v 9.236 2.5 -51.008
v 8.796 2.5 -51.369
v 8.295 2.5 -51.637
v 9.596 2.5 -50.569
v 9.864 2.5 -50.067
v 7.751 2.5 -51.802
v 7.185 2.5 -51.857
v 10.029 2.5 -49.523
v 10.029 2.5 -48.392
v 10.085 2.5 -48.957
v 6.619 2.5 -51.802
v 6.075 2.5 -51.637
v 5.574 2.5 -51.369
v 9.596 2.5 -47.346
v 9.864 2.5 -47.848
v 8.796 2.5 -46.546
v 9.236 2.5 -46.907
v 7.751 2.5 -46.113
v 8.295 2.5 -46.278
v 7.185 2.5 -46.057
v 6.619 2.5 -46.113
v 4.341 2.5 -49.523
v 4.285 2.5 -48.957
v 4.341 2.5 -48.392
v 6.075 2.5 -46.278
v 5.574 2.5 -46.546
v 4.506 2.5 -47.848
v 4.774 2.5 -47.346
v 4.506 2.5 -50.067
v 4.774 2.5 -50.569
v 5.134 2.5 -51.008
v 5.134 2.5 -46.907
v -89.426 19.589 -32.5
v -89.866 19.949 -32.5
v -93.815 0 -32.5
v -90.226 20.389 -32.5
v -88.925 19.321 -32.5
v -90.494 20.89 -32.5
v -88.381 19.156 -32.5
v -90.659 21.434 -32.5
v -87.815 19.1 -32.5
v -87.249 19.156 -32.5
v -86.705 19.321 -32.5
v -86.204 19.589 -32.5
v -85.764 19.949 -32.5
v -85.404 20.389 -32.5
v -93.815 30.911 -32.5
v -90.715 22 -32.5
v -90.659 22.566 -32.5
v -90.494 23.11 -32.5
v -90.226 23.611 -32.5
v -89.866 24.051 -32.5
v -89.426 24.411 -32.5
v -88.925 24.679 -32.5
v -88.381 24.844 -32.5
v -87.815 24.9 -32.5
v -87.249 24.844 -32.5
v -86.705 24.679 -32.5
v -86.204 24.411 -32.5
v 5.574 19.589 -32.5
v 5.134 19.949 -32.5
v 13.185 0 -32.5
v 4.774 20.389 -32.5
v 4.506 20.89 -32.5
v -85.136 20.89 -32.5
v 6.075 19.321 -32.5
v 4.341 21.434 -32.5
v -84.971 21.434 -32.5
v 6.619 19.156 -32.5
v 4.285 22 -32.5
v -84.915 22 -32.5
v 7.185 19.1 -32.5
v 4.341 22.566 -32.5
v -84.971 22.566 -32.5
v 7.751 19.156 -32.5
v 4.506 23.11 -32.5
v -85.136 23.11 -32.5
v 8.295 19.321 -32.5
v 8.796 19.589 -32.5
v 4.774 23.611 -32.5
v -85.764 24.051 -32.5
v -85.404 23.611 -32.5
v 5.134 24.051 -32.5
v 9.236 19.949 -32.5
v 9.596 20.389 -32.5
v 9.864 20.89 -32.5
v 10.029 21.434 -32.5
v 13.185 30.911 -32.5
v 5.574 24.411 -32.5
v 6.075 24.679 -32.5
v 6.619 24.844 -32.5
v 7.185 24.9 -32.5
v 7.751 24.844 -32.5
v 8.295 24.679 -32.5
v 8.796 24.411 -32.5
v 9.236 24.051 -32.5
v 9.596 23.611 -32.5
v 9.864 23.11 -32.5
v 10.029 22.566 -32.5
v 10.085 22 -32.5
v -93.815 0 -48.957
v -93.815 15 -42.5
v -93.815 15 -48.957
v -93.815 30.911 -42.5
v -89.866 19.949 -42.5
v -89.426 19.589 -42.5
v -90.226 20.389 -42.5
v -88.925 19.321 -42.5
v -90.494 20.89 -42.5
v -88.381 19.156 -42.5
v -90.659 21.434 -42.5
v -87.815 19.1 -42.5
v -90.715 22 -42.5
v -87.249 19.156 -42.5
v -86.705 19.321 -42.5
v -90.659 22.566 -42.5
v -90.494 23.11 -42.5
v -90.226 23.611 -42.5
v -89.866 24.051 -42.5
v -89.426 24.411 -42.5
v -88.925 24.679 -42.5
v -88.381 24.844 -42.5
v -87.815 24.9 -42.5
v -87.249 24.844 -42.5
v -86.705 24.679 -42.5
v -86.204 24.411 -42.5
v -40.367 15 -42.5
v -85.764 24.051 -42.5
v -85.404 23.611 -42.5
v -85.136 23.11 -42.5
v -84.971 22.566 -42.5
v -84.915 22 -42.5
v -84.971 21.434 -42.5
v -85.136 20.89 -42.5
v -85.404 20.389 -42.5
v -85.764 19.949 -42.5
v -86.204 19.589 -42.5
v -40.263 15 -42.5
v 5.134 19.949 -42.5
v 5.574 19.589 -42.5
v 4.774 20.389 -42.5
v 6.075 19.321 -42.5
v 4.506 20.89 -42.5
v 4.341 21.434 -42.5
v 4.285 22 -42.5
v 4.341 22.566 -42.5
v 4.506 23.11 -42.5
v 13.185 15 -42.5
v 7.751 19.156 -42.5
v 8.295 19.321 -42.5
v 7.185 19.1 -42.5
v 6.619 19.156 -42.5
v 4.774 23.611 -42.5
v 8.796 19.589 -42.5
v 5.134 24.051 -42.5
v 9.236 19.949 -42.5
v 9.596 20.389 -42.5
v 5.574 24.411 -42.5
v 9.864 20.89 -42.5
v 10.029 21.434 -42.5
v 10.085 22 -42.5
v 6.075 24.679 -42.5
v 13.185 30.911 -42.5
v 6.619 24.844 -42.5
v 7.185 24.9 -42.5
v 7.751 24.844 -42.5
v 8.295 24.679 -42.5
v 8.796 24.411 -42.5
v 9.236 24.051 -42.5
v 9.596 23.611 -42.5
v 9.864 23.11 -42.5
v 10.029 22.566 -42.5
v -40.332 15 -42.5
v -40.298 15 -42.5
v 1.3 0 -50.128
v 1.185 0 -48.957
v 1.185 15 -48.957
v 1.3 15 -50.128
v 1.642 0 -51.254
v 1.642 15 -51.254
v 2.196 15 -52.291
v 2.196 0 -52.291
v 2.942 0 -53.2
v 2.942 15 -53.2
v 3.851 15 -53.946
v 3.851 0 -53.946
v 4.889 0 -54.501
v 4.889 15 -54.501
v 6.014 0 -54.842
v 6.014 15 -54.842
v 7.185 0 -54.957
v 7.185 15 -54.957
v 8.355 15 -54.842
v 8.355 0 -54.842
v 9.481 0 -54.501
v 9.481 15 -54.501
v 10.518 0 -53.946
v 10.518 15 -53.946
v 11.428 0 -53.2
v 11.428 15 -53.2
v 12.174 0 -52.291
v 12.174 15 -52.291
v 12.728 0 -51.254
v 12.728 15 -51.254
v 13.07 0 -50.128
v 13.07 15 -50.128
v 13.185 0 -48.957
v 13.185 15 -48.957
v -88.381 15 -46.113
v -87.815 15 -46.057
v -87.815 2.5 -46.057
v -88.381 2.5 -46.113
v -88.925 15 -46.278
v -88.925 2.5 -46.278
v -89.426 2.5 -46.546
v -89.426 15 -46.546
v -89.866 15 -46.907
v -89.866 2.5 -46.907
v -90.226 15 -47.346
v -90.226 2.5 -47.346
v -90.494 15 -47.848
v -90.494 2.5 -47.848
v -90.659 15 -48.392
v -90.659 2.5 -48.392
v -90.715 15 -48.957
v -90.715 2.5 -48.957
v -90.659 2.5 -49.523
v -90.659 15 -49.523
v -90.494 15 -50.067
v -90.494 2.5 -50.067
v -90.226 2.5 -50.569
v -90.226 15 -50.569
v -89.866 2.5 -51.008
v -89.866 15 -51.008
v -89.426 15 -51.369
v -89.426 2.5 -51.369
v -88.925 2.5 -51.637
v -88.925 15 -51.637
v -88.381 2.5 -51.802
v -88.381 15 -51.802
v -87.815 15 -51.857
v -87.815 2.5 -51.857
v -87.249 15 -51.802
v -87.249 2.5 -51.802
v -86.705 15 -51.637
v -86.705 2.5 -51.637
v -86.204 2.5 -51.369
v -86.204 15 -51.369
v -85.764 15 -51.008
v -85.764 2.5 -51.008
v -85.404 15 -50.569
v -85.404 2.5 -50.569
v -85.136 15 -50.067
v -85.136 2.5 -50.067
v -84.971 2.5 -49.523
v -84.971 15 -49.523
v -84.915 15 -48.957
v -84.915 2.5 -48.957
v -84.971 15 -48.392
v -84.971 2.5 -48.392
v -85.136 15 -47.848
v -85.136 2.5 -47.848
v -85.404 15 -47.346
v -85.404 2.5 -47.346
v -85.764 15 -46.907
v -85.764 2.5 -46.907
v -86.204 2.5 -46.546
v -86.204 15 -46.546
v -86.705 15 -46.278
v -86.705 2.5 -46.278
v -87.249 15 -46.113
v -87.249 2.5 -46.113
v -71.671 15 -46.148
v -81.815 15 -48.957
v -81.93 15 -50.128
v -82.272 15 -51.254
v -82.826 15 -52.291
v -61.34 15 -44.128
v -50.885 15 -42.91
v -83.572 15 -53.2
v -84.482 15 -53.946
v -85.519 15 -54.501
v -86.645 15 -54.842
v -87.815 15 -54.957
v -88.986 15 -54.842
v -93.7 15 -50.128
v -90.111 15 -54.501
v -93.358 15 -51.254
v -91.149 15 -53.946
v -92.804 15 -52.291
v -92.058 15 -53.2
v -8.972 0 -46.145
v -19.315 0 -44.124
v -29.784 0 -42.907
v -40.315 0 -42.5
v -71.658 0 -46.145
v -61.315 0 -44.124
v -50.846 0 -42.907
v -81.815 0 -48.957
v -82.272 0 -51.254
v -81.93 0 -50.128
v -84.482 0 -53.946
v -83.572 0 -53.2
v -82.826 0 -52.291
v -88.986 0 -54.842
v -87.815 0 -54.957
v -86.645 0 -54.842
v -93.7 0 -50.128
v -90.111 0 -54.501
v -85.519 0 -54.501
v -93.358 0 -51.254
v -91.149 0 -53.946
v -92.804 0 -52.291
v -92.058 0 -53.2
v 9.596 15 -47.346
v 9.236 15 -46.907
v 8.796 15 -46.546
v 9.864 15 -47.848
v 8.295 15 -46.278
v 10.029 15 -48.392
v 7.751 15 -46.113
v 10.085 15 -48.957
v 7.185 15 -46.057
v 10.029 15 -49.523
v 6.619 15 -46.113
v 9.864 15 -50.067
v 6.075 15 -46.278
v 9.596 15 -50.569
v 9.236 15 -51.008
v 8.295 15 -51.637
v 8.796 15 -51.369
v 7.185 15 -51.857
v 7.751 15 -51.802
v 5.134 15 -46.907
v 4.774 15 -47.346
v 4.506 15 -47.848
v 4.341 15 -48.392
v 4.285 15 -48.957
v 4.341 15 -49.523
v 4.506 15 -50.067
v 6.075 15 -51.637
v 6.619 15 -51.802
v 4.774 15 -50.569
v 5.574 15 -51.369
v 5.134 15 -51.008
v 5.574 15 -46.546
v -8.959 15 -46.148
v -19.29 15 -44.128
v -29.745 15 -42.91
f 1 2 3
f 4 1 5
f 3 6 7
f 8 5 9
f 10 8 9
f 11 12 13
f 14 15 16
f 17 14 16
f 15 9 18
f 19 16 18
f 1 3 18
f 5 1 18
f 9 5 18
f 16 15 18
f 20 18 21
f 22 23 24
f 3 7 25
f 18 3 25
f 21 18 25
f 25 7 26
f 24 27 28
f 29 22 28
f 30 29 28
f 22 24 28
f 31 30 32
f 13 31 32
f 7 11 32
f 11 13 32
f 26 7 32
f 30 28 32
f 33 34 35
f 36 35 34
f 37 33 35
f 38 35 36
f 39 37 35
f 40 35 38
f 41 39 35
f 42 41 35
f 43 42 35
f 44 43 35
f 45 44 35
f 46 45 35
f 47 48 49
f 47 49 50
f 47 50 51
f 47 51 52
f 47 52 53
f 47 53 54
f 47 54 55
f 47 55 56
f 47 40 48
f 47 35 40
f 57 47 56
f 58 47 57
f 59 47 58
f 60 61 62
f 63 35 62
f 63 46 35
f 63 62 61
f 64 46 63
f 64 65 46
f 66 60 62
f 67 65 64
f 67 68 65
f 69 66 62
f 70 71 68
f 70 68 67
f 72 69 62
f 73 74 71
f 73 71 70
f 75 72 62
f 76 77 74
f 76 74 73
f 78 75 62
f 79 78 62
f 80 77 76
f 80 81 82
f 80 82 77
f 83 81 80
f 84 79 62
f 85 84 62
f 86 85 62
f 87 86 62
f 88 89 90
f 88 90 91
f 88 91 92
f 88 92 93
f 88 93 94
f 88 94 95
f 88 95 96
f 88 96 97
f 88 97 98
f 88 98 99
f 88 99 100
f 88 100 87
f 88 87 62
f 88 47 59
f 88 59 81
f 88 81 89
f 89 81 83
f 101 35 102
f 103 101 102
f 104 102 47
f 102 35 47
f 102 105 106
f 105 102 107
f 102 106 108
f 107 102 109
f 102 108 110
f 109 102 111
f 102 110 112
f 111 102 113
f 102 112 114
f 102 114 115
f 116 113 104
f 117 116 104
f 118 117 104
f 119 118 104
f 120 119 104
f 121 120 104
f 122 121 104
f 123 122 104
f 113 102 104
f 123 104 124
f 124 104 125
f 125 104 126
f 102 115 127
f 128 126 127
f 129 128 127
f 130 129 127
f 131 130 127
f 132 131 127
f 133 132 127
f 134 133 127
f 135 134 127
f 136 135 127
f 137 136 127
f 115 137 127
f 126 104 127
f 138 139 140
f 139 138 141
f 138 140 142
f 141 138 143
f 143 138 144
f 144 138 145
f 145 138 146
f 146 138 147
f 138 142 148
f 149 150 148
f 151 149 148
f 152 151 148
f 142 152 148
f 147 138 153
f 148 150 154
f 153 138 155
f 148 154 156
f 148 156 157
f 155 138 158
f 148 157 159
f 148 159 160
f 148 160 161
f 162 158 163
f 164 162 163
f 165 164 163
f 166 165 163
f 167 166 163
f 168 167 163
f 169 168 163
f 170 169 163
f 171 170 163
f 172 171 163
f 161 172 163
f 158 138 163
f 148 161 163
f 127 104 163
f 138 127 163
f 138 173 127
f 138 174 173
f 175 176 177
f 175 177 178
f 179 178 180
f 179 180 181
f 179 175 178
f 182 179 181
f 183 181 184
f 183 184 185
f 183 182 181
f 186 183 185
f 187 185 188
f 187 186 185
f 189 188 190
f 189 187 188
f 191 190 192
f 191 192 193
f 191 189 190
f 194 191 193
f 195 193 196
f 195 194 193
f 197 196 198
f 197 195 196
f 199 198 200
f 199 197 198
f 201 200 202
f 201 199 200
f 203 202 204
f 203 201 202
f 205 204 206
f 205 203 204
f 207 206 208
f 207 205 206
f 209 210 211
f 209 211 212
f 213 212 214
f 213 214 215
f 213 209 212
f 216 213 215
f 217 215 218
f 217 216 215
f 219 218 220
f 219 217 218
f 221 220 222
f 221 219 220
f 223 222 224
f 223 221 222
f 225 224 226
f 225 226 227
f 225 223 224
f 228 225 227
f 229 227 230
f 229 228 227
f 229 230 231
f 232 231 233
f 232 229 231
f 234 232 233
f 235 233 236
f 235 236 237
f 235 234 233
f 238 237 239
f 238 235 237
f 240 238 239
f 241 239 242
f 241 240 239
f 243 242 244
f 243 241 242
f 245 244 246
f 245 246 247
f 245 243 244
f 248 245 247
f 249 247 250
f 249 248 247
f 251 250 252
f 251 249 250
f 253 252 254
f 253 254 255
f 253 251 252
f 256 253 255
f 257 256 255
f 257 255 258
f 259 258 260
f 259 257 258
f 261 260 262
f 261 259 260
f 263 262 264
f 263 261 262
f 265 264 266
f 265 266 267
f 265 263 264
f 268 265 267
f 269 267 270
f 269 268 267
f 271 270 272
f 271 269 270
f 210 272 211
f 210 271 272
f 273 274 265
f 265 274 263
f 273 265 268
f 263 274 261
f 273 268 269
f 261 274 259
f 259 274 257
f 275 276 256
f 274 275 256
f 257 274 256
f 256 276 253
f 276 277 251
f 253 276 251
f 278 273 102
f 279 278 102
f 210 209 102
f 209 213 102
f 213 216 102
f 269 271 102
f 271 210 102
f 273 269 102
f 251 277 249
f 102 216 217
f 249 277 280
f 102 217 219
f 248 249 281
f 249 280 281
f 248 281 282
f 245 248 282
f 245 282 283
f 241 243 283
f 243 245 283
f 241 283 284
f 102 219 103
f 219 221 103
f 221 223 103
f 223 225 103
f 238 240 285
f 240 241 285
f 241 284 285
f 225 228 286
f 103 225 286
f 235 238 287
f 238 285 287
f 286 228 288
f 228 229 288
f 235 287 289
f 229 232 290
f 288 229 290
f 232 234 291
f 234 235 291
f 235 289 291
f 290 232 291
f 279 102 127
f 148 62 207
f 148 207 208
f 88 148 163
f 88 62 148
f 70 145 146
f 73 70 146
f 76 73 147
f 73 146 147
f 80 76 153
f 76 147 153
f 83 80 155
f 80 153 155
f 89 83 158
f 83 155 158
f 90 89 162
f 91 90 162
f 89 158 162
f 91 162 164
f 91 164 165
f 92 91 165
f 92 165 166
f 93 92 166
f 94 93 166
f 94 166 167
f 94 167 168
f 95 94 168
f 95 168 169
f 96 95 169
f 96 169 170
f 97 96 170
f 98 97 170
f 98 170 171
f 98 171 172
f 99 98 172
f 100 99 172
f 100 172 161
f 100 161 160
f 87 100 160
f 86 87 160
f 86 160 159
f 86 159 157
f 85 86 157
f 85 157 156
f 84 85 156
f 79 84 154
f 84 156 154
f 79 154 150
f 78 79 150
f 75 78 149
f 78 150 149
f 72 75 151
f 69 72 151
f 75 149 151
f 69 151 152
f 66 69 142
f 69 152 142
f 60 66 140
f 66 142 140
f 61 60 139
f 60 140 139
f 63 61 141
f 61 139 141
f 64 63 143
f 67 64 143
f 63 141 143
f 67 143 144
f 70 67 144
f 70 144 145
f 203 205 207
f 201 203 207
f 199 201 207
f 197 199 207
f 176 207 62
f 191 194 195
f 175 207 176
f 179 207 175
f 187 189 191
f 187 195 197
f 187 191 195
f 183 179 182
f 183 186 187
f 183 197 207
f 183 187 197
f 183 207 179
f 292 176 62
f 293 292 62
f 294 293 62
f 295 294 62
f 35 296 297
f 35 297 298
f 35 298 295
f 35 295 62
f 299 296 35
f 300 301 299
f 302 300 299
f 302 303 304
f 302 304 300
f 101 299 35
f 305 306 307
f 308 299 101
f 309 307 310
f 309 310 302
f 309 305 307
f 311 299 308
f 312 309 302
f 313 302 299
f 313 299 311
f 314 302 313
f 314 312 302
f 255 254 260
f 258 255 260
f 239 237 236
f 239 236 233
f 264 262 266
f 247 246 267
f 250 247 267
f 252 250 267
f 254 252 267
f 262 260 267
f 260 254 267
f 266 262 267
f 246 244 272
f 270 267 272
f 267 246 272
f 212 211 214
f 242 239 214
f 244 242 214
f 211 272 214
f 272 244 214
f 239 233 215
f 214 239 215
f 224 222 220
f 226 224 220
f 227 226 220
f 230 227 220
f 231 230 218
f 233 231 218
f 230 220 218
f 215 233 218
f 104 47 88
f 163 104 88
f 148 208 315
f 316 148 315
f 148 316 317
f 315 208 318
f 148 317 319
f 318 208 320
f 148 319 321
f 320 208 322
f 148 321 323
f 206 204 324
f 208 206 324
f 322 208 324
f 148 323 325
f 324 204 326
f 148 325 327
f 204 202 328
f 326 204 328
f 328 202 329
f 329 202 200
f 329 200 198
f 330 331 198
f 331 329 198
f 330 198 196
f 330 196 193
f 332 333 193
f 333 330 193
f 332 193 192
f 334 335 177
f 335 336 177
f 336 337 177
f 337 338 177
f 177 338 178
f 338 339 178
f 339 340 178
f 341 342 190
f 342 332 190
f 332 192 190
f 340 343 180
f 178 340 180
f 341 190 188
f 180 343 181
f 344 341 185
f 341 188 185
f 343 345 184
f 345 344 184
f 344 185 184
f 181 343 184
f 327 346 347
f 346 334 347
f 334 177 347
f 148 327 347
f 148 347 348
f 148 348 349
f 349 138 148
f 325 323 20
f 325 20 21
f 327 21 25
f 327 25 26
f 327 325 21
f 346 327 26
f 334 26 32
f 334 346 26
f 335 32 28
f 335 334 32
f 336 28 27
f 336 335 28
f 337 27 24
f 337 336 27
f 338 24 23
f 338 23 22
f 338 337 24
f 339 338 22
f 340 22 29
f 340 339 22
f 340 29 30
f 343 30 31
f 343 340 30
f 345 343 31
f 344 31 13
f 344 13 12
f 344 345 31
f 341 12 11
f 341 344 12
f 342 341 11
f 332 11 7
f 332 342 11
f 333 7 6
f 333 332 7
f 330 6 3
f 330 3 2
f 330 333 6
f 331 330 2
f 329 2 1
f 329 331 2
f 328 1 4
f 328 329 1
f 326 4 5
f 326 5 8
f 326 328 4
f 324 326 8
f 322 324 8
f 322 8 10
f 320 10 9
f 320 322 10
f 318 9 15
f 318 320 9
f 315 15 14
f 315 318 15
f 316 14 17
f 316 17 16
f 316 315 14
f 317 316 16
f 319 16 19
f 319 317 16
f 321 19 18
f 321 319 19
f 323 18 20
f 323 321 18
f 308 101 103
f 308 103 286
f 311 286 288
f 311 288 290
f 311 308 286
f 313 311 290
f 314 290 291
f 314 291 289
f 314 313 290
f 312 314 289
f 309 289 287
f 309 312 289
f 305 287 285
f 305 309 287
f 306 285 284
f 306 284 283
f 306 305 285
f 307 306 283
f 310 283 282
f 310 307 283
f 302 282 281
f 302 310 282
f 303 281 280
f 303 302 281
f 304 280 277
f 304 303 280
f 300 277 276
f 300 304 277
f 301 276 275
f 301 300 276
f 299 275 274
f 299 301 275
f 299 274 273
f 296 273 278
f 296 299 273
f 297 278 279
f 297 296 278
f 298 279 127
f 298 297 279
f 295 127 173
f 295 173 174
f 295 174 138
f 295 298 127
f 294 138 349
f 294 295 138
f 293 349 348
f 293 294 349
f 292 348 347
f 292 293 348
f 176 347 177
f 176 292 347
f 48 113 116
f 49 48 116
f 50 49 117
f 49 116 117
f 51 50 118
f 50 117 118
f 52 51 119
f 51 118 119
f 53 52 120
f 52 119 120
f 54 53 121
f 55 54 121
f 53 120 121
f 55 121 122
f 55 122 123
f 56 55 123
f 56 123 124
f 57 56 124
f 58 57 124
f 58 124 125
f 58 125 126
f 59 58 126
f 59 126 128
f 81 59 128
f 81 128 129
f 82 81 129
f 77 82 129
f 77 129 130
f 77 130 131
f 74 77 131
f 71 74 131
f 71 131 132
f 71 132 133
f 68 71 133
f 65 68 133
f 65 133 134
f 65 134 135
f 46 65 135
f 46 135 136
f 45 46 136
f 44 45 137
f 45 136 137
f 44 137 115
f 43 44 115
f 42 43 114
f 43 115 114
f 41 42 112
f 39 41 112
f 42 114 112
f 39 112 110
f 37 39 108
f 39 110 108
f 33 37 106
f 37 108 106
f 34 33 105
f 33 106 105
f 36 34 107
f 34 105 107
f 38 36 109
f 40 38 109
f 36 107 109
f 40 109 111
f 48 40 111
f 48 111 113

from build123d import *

# Parameters (mm, degrees)
BOSS_EXTRUDE1_DEPTH = 15
SKETCH5_W           = 107
SKETCH5_H           = 15.91087052
BOSS_EXTRUDE2_DEPTH = 10
CUT_EXTRUDE1_START  = -15
SKETCH6_R           = 2.9
CUT_EXTRUDE1_DEPTH  = 12.5
SKETCH7_R           = 2.9
CUT_EXTRUDE2_DEPTH  = 12.5


with BuildPart() as part:
    # Sketch4 → Boss-Extrude1 (new body)
    with BuildSketch(Plane(origin=(0, 0, 0), x_dir=(1, 0, 0), z_dir=(0, 1, 0))):
        with BuildLine():
            Line((13.184906132, 32.500351338), (-93.815093868, 32.500351338))
            Line((-93.815093868, 32.500351338), (-93.815093868, 48.957491145))
            ThreePointArc((-93.815093868, 48.957491145), (-87.815093868, 54.957491145), (-81.815093868, 48.957491145))
            ThreePointArc((-81.815093868, 48.957491145), (-40.315093868, 42.500341518), (1.184906132, 48.957491145))
            ThreePointArc((1.184906132, 48.957491145), (7.184906132, 54.957491145), (13.184906132, 48.957491145))
            Line((13.184906132, 48.957491145), (13.184906132, 32.500351338))
        make_face()
    extrude(amount=BOSS_EXTRUDE1_DEPTH)

    # Sketch5 → Boss-Extrude2 (add)
    with BuildSketch(Plane.XY.offset(-32.500351338)):
        with Locations((-40.315093868, 22.95543526)):
            Rectangle(SKETCH5_W, SKETCH5_H)
    extrude(amount=-BOSS_EXTRUDE2_DEPTH)

    # Sketch6 → Cut-Extrude1 (cut)
    with BuildSketch(Plane.XZ.offset(CUT_EXTRUDE1_START)):
        with Locations(Location((7.184906132, -48.957491145, 0), (0, 0, 90))):
            Circle(SKETCH6_R)
        with Locations(Location((-87.815093868, -48.957491145, 0), (0, 0, 90))):
            Circle(SKETCH6_R)
    extrude(amount=CUT_EXTRUDE1_DEPTH, mode=Mode.SUBTRACT)

    # Sketch7 → Cut-Extrude2 (cut)
    with BuildSketch(Plane(origin=(0, 0, -42.500351338), x_dir=(-1, 0, 0), z_dir=(0, 0, -1))):
        with Locations((-7.184906132, 22)):
            Circle(SKETCH7_R)
        with Locations((87.815093868, 22)):
            Circle(SKETCH7_R)
    extrude(amount=-CUT_EXTRUDE2_DEPTH, mode=Mode.SUBTRACT)


solid = part.part
